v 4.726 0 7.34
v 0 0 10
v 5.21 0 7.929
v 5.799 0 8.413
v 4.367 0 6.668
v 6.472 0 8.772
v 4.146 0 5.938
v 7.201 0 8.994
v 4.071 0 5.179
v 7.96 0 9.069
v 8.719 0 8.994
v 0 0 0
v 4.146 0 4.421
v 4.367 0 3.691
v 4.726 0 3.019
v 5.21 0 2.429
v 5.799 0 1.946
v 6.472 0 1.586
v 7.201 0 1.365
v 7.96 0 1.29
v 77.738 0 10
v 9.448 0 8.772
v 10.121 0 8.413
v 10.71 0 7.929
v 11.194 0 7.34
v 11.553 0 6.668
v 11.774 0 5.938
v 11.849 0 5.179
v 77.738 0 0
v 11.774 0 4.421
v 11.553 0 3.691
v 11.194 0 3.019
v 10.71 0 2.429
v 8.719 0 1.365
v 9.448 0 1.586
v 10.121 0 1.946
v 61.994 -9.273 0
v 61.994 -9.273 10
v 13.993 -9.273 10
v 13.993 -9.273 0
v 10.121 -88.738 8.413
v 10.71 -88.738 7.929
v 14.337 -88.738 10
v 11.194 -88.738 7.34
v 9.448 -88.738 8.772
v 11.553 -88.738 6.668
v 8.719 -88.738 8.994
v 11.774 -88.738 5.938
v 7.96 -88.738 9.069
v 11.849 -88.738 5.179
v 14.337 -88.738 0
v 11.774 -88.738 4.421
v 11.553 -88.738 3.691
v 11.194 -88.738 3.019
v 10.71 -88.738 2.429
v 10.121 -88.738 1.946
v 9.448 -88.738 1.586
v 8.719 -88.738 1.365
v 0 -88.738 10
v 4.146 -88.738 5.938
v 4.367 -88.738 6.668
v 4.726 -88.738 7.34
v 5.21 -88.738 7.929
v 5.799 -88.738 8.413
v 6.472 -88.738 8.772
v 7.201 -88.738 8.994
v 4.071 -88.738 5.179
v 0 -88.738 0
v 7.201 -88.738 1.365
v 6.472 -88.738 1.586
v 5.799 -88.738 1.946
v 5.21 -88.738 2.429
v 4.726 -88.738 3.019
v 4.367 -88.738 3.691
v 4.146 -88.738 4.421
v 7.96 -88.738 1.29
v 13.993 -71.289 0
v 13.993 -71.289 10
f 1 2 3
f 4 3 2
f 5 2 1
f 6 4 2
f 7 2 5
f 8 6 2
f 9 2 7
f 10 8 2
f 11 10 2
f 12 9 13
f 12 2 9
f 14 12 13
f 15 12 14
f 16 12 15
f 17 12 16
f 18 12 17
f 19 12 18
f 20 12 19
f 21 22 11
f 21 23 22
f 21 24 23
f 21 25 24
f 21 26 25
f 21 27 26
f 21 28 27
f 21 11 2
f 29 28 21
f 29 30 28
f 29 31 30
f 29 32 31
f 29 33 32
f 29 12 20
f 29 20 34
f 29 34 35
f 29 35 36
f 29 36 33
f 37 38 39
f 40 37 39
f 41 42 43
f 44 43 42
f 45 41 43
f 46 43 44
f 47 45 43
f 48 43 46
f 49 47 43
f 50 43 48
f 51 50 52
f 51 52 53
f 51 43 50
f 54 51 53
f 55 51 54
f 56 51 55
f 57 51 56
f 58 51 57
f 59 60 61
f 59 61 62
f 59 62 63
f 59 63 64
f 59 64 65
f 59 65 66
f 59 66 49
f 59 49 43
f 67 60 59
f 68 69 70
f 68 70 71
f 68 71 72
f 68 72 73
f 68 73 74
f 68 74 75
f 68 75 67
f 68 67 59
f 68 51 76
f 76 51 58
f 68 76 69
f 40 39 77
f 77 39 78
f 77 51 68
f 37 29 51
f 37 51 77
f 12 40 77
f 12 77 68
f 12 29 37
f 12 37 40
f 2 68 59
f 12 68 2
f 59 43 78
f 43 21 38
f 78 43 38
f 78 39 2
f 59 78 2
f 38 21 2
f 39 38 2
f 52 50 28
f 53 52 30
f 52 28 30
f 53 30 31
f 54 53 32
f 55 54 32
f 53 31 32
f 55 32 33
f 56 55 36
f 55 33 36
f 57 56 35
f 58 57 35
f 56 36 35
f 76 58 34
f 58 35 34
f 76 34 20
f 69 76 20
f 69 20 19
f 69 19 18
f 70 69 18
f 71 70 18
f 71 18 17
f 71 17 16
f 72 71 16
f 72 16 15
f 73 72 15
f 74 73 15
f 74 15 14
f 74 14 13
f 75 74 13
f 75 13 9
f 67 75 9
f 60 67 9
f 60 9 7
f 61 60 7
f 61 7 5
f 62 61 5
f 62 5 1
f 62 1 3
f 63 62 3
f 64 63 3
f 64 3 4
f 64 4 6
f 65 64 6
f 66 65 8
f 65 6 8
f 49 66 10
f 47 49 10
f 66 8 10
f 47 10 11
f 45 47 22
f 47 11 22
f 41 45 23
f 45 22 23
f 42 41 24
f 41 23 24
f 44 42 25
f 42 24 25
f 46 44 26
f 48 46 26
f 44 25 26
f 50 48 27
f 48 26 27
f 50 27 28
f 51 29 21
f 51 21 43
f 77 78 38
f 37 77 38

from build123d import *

# Parameters (mm, degrees)
BOSS_EXTRU_1_DEPTH      = 10
ESQUISSE2_R             = 3.889151143
ENL_V_MAT_EXTRU_1_DEPTH = 89.737541713
ENL_V_MAT_EXTRU_2_DEPTH = 11


with BuildPart() as part:
    # Esquisse1 → Boss.-Extru.1 (new body)
    with BuildSketch(Plane.XY):
        Polygon((0, 0), (77.738226815, 0), (14.337114468, -88.737541713), (0, -88.737541713), align=None)
    extrude(amount=BOSS_EXTRU_1_DEPTH)

    # Esquisse2 → Enlèv. mat.-Extru.1 (cut, through all)
    with BuildSketch(Plane(origin=(0, 0, 0), x_dir=(1, 0, 0), z_dir=(0, 1, 0))):
        with Locations((7.959936212, -5.179369155)):
            Circle(ESQUISSE2_R)
    extrude(amount=-ENL_V_MAT_EXTRU_1_DEPTH, mode=Mode.SUBTRACT)

    # Esquisse4 → Enlèv. mat.-Extru.2 (cut, through all)
    with BuildSketch(Plane.XY.offset(10)):
        Polygon((13.992554962, -9.272968918), (13.992554962, -71.289178), (61.99380154, -9.272968918), align=None)
    extrude(amount=-ENL_V_MAT_EXTRU_2_DEPTH, mode=Mode.SUBTRACT)


solid = part.part
